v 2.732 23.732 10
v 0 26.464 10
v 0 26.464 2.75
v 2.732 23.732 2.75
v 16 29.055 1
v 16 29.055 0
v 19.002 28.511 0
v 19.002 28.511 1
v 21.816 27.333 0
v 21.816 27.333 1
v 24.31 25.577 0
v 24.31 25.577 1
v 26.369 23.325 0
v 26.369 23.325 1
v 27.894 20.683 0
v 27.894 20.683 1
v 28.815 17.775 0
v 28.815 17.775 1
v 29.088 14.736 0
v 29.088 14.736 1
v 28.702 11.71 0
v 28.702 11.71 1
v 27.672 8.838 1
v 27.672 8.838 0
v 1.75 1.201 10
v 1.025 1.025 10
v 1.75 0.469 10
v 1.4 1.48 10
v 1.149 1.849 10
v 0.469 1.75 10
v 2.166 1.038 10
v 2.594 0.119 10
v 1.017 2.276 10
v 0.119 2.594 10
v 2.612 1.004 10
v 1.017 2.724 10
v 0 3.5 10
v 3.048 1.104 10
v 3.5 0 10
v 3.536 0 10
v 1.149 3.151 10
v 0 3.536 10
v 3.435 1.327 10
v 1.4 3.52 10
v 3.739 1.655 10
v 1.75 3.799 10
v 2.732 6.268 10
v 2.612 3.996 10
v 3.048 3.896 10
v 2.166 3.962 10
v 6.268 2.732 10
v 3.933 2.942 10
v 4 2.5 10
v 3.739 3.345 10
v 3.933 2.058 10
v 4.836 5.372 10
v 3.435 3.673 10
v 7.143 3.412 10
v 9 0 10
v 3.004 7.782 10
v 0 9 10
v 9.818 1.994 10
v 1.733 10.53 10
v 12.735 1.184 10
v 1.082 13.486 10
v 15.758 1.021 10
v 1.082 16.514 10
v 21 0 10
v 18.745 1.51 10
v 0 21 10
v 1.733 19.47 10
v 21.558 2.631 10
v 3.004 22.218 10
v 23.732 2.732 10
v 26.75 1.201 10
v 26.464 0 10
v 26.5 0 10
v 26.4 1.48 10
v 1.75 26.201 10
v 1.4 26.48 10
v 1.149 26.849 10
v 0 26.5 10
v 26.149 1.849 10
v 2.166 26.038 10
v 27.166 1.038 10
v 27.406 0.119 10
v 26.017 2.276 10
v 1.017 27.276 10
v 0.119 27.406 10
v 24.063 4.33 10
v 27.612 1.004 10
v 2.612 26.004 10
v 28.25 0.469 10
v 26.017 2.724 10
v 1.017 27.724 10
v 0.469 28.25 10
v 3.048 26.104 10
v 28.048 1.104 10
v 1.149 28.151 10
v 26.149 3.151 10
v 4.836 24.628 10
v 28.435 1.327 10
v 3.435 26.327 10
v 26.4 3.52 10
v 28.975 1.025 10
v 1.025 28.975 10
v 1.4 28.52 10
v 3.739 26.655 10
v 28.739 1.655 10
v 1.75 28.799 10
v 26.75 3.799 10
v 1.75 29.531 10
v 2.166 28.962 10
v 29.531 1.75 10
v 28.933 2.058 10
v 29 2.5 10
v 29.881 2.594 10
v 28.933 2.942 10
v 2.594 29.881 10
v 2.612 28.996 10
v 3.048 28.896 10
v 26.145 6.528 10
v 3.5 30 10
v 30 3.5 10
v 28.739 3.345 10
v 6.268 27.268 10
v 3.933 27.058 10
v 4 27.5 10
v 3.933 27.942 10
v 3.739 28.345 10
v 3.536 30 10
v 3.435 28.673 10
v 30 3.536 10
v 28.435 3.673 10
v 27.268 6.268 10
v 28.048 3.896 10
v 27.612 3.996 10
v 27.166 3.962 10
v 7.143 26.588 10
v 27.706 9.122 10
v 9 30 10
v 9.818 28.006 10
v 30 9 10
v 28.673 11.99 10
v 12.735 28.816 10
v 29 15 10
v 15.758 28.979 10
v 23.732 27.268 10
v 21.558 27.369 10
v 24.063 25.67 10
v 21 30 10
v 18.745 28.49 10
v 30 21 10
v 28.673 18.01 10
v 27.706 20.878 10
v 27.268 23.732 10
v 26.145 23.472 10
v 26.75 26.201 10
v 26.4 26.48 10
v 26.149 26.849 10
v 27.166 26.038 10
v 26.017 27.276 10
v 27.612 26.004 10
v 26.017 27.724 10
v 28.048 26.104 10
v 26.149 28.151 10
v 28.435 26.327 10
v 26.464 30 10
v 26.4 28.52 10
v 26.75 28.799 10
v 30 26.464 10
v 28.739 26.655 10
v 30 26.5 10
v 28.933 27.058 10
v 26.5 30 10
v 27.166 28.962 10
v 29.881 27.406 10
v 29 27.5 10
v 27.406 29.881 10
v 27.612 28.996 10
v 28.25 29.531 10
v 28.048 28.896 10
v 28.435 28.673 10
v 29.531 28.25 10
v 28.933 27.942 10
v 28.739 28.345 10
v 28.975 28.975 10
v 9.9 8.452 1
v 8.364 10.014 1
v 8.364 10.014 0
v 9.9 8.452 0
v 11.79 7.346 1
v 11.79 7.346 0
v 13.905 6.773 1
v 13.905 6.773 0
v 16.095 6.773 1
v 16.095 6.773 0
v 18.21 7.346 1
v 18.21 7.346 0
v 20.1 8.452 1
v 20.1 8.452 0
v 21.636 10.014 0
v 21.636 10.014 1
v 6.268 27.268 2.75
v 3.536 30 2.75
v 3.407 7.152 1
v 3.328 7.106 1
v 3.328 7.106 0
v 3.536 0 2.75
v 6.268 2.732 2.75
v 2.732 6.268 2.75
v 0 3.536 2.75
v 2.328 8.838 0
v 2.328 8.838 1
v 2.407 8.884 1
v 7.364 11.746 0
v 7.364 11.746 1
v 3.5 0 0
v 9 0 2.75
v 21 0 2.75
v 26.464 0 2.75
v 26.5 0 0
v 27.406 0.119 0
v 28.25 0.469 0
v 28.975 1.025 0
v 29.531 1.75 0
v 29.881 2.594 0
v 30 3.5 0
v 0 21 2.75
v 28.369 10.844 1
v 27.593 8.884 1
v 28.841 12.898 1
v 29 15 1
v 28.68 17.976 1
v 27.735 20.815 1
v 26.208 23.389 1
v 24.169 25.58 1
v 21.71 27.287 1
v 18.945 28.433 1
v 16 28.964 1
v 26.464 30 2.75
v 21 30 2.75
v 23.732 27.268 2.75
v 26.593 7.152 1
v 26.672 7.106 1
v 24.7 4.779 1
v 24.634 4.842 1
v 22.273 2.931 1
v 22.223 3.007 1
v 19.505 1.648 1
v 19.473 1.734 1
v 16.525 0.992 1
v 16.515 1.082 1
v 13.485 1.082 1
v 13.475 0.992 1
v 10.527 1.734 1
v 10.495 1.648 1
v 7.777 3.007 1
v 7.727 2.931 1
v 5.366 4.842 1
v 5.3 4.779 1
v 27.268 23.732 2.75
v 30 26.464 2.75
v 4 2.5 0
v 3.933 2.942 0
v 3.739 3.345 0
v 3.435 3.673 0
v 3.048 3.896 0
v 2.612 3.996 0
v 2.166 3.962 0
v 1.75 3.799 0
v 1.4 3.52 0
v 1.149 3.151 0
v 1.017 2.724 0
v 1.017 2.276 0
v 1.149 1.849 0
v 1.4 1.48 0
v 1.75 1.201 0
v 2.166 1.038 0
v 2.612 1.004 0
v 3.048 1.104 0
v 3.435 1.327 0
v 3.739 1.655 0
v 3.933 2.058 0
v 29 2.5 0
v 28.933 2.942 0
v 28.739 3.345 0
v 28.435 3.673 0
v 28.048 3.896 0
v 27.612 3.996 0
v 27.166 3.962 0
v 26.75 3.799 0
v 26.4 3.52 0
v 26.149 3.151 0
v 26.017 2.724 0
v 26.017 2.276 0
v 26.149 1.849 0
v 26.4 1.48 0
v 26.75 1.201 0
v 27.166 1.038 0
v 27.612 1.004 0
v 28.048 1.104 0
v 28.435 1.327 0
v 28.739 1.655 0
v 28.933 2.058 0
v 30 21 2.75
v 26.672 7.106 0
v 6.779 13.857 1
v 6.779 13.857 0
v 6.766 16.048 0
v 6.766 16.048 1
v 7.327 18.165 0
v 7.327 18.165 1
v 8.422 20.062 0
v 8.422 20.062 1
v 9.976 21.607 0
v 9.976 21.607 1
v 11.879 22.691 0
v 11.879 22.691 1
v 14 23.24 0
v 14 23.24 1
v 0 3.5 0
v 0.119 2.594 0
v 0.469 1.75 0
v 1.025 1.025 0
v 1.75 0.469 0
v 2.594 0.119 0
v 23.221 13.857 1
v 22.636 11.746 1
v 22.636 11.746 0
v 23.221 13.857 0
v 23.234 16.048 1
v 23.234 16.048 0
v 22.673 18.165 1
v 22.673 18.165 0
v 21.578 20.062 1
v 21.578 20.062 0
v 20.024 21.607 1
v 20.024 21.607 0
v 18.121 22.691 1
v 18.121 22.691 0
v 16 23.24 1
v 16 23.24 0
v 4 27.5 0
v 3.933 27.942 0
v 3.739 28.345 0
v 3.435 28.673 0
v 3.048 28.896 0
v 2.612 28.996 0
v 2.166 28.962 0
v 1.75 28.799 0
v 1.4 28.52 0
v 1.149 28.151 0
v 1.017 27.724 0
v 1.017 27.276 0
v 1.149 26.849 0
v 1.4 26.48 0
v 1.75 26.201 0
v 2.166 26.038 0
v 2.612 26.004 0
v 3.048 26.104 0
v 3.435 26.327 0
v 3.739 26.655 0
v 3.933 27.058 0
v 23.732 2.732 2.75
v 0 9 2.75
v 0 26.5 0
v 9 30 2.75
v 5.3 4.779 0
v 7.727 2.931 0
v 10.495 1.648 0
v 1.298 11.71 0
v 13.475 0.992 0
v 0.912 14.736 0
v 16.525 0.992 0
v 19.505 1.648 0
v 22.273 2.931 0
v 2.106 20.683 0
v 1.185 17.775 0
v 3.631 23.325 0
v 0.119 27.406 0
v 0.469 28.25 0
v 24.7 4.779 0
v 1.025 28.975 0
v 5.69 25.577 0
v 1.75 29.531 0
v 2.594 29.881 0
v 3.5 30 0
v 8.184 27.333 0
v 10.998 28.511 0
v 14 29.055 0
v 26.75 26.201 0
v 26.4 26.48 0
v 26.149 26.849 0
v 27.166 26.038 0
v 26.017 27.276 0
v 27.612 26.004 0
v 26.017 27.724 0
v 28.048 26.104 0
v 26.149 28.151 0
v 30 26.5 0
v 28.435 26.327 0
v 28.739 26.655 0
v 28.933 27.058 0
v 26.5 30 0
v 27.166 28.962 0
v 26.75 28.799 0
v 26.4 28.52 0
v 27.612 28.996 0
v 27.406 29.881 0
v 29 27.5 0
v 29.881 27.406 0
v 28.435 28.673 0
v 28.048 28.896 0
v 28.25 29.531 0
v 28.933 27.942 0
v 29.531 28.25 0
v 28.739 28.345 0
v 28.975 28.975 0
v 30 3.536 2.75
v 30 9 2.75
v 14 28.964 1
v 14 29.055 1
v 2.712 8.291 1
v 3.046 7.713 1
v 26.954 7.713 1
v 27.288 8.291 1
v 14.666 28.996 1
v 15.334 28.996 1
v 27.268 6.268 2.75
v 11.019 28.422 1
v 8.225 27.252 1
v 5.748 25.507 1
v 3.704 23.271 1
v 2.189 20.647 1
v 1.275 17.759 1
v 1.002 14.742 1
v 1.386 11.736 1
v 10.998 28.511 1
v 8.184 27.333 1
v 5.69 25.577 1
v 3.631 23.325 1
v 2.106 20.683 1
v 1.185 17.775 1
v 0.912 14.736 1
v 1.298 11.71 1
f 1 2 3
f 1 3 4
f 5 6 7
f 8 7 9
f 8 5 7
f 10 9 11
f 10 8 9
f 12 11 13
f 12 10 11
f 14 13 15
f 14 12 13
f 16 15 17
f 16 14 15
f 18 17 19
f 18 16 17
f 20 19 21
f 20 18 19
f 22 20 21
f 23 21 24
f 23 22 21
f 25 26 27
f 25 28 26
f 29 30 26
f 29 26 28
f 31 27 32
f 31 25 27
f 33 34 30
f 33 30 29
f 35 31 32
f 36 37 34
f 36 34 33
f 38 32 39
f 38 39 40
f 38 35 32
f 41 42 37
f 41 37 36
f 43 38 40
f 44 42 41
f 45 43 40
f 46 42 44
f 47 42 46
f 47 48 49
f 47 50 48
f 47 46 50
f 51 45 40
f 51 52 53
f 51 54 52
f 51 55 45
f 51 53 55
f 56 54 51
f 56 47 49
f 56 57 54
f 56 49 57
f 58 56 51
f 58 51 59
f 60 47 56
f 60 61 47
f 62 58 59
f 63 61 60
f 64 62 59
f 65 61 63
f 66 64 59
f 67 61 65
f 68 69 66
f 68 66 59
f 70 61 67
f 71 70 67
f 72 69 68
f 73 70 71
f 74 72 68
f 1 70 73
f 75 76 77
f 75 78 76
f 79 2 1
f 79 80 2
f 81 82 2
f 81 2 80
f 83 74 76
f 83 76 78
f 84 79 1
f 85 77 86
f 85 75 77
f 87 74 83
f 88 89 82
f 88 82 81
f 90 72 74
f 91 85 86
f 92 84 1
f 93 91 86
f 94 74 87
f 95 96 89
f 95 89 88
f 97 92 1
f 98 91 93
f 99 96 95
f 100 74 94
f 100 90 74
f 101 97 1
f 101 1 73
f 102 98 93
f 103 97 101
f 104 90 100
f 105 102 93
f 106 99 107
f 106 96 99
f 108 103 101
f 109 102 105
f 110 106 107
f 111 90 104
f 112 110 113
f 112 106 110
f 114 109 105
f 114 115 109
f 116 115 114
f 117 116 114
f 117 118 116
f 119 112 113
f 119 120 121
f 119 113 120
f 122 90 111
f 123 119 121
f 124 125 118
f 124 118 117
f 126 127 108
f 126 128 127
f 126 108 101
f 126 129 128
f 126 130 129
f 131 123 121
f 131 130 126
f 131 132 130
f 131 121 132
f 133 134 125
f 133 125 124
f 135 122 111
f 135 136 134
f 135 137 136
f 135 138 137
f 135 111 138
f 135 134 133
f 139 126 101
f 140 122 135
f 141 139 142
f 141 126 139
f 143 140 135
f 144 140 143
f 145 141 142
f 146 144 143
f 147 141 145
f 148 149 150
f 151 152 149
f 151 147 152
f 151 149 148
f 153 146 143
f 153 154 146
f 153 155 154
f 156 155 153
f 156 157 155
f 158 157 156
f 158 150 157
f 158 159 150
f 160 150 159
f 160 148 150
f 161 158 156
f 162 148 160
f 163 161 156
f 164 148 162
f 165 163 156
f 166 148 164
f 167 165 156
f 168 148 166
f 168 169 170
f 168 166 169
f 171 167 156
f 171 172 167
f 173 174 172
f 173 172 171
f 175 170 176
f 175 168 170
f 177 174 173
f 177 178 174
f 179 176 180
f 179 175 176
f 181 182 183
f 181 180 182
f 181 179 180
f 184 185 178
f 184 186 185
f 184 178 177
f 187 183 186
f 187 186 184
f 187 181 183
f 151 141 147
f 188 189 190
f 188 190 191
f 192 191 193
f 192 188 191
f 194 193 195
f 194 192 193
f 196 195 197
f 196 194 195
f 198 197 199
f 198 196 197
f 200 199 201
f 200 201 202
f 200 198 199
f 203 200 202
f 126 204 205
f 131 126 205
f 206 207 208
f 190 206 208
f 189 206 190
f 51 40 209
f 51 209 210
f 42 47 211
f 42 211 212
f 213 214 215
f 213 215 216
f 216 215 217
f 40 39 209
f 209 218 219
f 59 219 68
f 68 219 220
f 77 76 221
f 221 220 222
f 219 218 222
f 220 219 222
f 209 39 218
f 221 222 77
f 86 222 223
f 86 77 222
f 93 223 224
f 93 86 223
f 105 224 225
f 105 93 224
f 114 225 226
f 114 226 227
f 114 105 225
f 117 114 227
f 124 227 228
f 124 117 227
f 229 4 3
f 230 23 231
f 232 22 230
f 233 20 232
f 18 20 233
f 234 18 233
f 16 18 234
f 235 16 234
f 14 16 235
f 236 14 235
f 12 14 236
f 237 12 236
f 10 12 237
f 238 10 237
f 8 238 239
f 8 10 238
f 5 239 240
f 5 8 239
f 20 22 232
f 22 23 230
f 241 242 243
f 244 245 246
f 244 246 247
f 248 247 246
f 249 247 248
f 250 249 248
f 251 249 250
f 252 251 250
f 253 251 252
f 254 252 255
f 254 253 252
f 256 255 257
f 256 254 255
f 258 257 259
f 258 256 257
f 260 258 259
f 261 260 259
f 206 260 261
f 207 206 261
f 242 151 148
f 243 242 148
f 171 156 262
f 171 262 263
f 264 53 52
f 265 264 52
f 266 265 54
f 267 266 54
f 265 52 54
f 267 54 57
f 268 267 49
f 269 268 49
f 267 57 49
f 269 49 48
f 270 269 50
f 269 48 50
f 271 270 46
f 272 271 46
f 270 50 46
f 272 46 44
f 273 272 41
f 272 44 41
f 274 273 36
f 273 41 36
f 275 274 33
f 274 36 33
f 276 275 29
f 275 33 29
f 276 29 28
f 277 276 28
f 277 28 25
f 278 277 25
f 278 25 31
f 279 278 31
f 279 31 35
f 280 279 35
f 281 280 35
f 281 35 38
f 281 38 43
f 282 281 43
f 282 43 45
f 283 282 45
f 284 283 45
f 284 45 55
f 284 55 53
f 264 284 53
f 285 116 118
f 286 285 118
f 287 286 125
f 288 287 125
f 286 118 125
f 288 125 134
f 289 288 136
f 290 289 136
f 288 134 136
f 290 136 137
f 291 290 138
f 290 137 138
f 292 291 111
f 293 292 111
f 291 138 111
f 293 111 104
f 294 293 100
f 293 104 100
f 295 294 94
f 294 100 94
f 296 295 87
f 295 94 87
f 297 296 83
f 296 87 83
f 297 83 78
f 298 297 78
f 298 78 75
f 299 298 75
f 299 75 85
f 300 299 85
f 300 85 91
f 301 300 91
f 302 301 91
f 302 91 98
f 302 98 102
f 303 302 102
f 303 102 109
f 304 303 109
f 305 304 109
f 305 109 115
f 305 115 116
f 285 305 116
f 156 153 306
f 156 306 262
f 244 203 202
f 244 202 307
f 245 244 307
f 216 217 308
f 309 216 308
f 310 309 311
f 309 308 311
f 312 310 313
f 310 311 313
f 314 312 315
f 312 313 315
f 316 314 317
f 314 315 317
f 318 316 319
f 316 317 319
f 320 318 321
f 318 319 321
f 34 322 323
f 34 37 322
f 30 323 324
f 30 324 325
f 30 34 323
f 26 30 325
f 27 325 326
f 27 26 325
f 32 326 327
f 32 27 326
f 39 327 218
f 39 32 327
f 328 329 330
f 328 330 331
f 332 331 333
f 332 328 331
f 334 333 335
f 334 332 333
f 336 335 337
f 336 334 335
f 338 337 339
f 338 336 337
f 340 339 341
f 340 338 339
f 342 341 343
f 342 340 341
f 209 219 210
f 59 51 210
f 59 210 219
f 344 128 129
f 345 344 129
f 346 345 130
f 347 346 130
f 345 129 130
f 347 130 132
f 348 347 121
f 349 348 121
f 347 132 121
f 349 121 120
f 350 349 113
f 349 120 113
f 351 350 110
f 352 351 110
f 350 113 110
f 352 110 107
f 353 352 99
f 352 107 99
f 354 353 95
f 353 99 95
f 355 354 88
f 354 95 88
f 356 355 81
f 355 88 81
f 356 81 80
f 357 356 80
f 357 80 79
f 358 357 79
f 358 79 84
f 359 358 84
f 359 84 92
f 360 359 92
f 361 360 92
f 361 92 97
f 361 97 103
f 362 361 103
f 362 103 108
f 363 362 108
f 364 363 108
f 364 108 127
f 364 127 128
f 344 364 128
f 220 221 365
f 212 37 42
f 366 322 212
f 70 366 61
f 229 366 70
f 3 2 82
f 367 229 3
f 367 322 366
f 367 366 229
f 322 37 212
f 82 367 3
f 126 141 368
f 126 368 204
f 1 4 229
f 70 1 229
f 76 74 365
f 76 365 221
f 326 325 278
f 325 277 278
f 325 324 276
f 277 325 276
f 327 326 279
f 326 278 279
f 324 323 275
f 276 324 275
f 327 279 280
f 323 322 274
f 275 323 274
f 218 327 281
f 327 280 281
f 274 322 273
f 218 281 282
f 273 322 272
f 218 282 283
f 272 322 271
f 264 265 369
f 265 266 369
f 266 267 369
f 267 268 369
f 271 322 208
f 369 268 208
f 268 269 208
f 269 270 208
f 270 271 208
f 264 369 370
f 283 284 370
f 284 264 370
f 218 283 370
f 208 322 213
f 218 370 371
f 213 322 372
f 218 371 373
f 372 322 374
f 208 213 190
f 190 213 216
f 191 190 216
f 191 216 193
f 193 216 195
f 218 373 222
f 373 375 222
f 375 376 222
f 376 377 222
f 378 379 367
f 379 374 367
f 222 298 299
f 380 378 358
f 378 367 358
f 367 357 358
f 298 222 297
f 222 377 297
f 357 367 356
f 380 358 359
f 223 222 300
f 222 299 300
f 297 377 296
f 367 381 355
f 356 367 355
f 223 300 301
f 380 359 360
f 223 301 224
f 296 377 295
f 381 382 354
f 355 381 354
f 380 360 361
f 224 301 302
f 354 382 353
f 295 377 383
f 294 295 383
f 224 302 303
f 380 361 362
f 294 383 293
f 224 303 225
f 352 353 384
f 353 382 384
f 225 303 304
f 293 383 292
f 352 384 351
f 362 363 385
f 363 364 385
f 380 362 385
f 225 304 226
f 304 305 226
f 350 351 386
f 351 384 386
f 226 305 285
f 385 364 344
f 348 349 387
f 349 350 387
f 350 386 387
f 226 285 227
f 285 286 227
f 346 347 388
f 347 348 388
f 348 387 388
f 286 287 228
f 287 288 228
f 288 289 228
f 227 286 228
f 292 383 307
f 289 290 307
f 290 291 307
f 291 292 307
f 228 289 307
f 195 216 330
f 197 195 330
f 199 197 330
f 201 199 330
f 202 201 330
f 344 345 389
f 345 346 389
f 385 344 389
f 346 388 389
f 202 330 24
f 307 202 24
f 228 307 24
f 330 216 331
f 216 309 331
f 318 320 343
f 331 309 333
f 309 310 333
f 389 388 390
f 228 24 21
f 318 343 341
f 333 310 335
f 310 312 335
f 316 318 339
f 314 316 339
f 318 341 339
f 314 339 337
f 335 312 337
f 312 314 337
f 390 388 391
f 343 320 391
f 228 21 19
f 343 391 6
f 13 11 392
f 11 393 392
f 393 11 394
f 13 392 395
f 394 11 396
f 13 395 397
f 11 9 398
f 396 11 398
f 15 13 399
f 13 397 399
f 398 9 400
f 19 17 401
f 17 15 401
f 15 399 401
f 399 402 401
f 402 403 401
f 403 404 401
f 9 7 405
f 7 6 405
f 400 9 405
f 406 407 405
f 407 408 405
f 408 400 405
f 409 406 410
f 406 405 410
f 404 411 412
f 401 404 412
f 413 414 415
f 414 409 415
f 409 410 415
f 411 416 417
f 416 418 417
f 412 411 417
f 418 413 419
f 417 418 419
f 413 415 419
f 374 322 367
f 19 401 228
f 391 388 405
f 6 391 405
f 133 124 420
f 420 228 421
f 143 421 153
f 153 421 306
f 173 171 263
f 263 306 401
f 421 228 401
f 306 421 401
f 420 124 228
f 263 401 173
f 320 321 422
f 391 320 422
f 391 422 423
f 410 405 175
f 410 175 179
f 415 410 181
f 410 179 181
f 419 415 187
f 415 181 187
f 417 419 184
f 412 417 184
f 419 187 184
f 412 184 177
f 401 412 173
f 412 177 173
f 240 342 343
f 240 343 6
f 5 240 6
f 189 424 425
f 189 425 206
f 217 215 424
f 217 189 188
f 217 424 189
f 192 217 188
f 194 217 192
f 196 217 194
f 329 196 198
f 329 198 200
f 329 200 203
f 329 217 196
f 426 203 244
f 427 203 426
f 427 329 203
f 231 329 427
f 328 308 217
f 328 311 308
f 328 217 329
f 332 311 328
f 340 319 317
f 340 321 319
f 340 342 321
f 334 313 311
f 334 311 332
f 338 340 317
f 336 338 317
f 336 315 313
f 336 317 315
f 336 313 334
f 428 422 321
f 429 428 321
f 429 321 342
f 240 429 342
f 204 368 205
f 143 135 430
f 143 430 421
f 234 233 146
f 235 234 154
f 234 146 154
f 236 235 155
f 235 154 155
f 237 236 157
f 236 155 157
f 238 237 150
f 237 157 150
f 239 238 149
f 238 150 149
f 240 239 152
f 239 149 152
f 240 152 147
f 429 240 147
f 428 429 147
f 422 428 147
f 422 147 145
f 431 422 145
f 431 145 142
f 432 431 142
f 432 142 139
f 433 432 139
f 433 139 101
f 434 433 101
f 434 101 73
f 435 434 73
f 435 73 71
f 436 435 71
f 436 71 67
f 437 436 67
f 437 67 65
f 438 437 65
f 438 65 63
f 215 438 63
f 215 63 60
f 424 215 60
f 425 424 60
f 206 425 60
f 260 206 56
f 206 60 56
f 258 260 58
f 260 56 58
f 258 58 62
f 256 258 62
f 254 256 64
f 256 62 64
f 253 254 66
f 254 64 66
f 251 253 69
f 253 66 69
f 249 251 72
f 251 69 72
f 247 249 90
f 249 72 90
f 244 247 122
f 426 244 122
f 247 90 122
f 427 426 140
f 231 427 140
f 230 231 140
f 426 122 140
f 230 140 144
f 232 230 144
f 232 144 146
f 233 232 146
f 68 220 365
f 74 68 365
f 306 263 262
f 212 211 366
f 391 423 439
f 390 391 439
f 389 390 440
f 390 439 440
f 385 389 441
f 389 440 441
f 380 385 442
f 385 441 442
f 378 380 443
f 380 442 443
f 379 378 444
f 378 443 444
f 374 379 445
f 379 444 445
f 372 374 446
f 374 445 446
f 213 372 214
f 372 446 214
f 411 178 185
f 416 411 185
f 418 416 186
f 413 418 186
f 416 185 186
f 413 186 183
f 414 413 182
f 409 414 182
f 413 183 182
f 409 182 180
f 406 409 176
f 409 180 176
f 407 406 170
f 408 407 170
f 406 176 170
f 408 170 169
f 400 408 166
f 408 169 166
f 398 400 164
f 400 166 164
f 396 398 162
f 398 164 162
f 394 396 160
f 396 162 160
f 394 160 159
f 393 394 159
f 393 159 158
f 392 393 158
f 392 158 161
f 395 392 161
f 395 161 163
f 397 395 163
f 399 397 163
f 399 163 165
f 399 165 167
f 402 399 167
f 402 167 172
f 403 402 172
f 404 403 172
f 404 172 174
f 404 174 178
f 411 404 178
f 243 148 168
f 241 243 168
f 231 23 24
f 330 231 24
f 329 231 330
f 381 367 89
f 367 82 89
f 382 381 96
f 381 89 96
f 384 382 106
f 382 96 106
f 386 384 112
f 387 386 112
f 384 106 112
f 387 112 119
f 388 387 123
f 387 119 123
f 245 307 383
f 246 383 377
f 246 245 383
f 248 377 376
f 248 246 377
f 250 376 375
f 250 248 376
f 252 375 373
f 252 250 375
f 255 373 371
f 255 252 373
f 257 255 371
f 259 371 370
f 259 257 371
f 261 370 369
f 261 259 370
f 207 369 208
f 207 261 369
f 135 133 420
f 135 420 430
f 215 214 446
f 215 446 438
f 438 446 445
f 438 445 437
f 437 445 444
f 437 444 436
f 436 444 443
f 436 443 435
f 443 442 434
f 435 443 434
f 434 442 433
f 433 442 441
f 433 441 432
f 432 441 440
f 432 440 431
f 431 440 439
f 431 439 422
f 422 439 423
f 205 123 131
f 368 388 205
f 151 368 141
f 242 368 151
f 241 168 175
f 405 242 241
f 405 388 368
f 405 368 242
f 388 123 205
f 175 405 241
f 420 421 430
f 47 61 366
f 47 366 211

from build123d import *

# Parameters (mm, degrees)
SKETCH1_W             = 30
SKETCH1_H             = 30
BOSS_EXTRUDE1_DEPTH   = 10
SKETCH2_R             = 14
CUT_EXTRUDE1_DEPTH    = 9
CUT_EXTRUDE2_DEPTH    = 44.370496884
F_3_0MM_DOWEL_HOLE1_D = 3
CUT_EXTRUDE3_DEPTH    = 7.25
FILLET1_R             = 3.5


with BuildPart() as part:
    # Sketch1 → Boss-Extrude1 (new body)
    with BuildSketch(Plane.XY):
        with Locations((15, 15)):
            Rectangle(SKETCH1_W, SKETCH1_H)
    extrude(amount=BOSS_EXTRUDE1_DEPTH)

    # Sketch2 → Cut-Extrude1 (cut)
    with BuildSketch(Plane.XY.offset(10)):
        with Locations((15, 15)):
            Circle(SKETCH2_R)
    extrude(amount=-CUT_EXTRUDE1_DEPTH, mode=Mode.SUBTRACT)

    # Sketch3 → Cut-Extrude2 (cut, through all)
    with BuildSketch(Plane.XY.offset(1)):
        with BuildLine():
            Line((14, 23.239538822), (14, 29.05542131))
            ThreePointArc((14, 29.05542131), (2.79687945, 22.045474934), (2.327648085, 8.838314749))
            Line((2.327648085, 8.838314749), (7.364350065, 11.746255993))
            ThreePointArc((7.364350065, 11.746255993), (7.811989149, 19.15), (14, 23.239538822))
        make_face()
        with BuildLine():
            Line((16, 23.239538822), (16, 29.05542131))
            ThreePointArc((16, 29.05542131), (27.20312055, 22.045474934), (27.672351915, 8.838314749))
            Line((27.672351915, 8.838314749), (22.635649935, 11.746255993))
            ThreePointArc((22.635649935, 11.746255993), (22.188010851, 19.15), (16, 23.239538822))
        make_face()
        with BuildLine():
            Line((21.635649935, 10.014205185), (26.672351915, 7.106263941))
            ThreePointArc((26.672351915, 7.106263941), (15, 0.909050131), (3.327648085, 7.106263941))
            Line((3.327648085, 7.106263941), (8.364350065, 10.014205185))
            ThreePointArc((8.364350065, 10.014205185), (15, 6.7), (21.635649935, 10.014205185))
        make_face()
    extrude(amount=-CUT_EXTRUDE2_DEPTH, mode=Mode.SUBTRACT)

    # Ø3.0mm Dowel Hole1 (through all)
    with Locations(Plane(origin=(0, 0, 0), x_dir=(-1, 0, 0), z_dir=(0, 0, -1))):
        with Locations((-27.5, 27.5), (-2.5, 27.5), (-2.5, 2.5), (-27.5, 2.5)):
            Hole(F_3_0MM_DOWEL_HOLE1_D / 2)

    # Sketch6 → Cut-Extrude3 (cut)
    with BuildSketch(Plane.XY.offset(10)):
        Polygon((9, 30), (6.267766953, 27.267766953), (3.535533906, 30), align=None)
        Polygon((23.732233047, 27.267766953), (26.464466094, 30), (21, 30), align=None)
        Polygon((30, 26.464466094), (30, 21), (27.267766953, 23.732233047), align=None)
        Polygon((30, 9), (30, 3.535533906), (27.267766953, 6.267766953), align=None)
        Polygon((26.464466094, 0), (21, 0), (23.732233047, 2.732233047), align=None)
        Polygon((9, 0), (3.535533906, 0), (6.267766953, 2.732233047), align=None)
        Polygon((0, 3.535533906), (0, 9), (2.732233047, 6.267766953), align=None)
        Polygon((0, 21), (0, 26.464466094), (2.732233047, 23.732233047), align=None)
    extrude(amount=-CUT_EXTRUDE3_DEPTH, mode=Mode.SUBTRACT)

    # Fillet1
    fillet1_edges = [part.edges().sort_by_distance(p)[0] for p in [
        (0, 30, 5),
        (30, 30, 5),
        (30, 0, 5),
        (0, 0, 5),
    ]]
    fillet(fillet1_edges, radius=FILLET1_R)


solid = part.part
